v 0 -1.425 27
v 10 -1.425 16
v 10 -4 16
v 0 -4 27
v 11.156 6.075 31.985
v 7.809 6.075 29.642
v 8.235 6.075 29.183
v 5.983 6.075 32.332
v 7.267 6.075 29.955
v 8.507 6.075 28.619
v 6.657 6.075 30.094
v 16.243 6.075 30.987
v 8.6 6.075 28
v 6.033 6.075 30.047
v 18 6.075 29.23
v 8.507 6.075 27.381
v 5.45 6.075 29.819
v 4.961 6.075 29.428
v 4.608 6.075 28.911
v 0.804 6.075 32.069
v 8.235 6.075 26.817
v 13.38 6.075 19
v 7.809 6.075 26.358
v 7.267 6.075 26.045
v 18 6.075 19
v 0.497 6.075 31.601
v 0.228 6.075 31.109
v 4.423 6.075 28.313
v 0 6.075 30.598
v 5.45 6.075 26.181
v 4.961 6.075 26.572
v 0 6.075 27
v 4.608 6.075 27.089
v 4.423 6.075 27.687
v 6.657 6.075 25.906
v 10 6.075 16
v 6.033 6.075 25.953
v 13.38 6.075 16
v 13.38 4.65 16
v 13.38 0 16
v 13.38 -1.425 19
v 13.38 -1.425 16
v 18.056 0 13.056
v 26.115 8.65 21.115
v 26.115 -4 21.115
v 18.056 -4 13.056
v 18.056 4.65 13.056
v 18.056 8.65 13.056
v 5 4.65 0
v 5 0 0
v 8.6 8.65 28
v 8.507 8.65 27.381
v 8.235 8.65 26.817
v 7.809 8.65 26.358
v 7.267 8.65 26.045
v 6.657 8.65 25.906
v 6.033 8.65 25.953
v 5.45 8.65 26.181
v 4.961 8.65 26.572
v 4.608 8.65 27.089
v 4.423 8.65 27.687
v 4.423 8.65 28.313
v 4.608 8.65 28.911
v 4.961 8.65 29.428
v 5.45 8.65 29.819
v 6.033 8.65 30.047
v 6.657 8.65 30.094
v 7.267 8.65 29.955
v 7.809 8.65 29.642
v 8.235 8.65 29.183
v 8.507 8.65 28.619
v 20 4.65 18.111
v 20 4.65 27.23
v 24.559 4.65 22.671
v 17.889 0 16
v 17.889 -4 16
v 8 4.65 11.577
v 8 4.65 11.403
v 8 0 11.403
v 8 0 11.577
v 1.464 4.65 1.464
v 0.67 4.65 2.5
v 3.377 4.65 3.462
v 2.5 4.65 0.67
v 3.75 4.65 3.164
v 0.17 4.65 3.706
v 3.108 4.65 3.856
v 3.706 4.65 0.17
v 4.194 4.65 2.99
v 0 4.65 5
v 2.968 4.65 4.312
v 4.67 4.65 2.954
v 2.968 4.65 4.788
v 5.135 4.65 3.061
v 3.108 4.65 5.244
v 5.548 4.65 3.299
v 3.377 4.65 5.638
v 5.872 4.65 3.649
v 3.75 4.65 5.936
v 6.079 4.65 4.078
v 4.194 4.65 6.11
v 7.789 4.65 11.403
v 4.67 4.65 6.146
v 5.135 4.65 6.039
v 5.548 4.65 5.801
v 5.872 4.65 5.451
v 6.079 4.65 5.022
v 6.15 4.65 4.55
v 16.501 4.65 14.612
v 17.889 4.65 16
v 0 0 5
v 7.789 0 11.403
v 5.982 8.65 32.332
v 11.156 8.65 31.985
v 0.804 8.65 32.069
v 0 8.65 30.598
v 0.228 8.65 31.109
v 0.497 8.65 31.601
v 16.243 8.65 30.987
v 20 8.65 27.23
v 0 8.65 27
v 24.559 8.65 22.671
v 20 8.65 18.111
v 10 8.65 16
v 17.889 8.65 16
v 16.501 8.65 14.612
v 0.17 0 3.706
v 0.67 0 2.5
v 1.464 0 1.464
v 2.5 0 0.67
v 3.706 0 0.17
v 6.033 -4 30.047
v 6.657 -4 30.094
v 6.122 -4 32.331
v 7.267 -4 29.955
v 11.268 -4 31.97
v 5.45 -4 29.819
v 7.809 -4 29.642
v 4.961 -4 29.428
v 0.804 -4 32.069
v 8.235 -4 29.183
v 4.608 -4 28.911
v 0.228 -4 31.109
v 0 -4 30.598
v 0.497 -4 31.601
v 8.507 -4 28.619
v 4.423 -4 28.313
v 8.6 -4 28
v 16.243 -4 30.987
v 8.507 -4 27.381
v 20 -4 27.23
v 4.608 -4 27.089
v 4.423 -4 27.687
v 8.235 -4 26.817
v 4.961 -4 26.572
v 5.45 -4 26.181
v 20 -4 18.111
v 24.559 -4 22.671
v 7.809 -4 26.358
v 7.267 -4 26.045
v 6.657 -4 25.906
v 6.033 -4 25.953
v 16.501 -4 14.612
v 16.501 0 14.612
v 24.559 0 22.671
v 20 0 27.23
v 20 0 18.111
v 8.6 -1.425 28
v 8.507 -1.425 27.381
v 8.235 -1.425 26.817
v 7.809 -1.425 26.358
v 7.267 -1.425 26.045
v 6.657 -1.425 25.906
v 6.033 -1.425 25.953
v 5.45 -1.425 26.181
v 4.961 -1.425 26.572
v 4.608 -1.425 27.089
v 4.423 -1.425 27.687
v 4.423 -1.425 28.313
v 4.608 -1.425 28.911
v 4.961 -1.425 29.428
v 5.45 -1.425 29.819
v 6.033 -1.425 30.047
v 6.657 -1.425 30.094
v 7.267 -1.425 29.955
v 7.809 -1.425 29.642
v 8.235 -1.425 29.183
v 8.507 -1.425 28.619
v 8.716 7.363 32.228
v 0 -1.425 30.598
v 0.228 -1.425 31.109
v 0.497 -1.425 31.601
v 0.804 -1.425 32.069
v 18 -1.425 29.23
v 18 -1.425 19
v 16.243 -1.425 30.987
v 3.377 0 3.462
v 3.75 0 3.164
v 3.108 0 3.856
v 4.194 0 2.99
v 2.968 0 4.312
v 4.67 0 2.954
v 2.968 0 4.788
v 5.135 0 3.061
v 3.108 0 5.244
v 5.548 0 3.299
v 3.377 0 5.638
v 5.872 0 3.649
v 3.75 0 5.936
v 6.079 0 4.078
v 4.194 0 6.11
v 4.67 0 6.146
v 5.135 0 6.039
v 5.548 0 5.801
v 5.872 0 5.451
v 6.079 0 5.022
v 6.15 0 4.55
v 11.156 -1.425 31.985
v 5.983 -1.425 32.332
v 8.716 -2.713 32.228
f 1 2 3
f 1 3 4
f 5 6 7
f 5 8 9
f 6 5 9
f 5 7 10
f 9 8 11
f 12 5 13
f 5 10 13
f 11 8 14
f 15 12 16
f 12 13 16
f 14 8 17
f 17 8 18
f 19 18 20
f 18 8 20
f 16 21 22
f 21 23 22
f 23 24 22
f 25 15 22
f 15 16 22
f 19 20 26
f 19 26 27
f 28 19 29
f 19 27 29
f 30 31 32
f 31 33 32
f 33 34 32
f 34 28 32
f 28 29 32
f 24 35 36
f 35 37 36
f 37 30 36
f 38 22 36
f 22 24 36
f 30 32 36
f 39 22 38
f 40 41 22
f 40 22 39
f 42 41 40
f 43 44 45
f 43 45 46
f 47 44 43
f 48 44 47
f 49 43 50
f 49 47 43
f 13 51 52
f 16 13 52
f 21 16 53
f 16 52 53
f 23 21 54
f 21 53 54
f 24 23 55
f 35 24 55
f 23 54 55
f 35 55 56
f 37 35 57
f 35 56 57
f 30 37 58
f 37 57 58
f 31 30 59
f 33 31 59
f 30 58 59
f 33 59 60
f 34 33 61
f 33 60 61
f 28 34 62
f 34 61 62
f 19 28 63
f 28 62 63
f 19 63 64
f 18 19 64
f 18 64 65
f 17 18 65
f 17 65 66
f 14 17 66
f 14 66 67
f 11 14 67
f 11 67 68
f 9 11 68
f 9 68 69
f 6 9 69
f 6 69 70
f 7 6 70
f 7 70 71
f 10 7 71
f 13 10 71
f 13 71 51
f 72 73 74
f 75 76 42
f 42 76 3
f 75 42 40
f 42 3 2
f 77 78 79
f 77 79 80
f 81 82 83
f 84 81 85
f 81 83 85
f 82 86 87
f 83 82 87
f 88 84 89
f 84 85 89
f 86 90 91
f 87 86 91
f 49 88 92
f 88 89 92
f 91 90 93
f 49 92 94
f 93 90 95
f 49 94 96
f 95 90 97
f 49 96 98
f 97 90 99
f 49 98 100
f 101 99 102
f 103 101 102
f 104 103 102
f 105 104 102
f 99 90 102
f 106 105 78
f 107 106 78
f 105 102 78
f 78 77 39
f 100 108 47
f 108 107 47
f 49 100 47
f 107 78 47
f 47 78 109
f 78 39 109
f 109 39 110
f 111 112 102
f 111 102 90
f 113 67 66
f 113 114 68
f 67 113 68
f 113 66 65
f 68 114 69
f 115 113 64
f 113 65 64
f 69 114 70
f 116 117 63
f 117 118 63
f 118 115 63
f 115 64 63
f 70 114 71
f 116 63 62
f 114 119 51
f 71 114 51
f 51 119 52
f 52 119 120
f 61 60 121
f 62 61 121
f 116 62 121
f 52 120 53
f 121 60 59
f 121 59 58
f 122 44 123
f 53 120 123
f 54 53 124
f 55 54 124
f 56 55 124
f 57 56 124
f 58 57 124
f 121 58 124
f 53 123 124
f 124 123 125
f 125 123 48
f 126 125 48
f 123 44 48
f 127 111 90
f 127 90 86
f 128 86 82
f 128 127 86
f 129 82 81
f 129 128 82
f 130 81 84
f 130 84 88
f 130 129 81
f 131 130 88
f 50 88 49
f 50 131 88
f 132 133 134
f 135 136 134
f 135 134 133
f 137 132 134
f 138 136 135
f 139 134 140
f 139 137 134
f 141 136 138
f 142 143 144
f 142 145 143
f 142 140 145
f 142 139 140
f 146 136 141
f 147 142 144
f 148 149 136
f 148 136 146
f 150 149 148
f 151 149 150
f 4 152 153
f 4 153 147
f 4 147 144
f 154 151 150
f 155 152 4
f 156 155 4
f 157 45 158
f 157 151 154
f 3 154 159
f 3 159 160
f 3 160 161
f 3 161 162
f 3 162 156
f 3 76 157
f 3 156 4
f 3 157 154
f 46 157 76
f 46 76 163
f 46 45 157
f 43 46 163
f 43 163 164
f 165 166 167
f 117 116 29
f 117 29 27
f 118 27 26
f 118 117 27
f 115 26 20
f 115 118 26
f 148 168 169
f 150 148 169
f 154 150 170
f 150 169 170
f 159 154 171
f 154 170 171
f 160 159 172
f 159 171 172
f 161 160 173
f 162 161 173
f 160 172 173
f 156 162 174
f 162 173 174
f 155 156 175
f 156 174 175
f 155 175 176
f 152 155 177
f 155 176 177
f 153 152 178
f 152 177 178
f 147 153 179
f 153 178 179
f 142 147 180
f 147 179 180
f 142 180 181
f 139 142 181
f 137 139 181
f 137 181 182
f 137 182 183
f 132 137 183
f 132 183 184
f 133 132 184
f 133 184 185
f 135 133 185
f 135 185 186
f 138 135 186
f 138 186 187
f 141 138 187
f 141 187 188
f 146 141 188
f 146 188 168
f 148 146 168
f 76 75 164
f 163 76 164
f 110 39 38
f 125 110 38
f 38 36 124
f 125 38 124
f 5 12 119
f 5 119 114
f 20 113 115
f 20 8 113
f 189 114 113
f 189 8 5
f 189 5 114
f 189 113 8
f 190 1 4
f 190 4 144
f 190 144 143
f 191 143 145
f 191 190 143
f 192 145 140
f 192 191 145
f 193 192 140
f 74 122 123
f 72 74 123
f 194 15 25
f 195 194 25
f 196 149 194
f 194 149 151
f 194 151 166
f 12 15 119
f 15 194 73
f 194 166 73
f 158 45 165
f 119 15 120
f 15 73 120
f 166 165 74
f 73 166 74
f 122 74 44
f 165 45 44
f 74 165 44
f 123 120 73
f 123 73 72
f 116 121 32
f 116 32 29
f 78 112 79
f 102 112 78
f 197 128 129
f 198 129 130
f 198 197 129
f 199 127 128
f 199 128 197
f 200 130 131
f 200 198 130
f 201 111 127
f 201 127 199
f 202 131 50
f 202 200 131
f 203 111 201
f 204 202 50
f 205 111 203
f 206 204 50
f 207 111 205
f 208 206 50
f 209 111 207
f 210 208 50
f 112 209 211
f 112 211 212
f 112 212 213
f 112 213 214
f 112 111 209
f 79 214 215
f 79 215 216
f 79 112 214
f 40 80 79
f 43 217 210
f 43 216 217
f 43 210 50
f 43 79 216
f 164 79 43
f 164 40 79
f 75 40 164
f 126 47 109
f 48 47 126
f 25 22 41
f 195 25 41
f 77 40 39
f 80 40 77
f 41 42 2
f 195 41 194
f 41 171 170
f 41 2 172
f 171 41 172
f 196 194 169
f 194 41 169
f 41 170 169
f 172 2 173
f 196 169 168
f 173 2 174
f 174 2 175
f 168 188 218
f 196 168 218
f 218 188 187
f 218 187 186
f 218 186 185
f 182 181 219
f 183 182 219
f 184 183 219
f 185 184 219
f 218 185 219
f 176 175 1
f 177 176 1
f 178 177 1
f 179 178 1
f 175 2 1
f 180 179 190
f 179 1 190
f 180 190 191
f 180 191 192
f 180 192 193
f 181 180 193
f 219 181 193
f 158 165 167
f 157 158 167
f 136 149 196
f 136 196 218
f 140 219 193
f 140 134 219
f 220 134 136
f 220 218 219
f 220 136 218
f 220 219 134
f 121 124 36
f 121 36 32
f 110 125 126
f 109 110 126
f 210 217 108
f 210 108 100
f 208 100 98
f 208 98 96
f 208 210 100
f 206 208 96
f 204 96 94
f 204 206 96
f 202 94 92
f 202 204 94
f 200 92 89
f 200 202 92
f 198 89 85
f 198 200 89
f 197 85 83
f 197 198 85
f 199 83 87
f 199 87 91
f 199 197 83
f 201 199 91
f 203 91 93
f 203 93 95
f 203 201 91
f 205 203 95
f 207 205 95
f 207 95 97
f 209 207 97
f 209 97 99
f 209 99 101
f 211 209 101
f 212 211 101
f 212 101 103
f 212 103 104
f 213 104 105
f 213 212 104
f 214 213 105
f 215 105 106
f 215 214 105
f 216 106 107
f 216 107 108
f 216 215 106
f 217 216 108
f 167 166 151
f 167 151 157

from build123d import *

# Parameters (mm, degrees)
SKETCH_1_R           = 1.6
EXTRUDE_1_DEPTH      = 4.65
SKETCH_7_W           = 9
SKETCH_7_H           = 19
EXTRUDE_4_DEPTH      = 4
SKETCH_8_W           = 9
SKETCH_8_H           = 19
EXTRUDE_5_DEPTH      = 4
SKETCH_9_W           = 16
SKETCH_9_H           = 7.5
CUT_EXTRUDE_3_DEPTH  = 9
SKETCH_11_R          = 2.1
CUT_EXTRUDE_5_DEPTH  = 26.4
EXTRUDE_6_DEPTH      = 9
SKETCH_13_W          = 19
SKETCH_13_H          = 12.65
EXTRUDE_7_DEPTH      = 2
SKETCH_15_W          = 7.596607022
SKETCH_15_H          = 7.5
CUT_EXTRUDE_6_DEPTH  = 8
CUT_EXTRUDE_7_DEPTH  = 8
EXTRUDE_8_DEPTH      = 4.65
CUT_EXTRUDE_9_DEPTH  = 4.65
SKETCH_20_W          = 5.380169682
SKETCH_20_H          = 3
CUT_EXTRUDE_10_DEPTH = 7.5
CUT_EXTRUDE_11_DEPTH = 4.65
CUT_EXTRUDE_13_DEPTH = 13
CUT_EXTRUDE_15_DEPTH = 13
SKETCH_26_W          = 18.396488504
SKETCH_26_H          = 12.65
EXTRUDE_9_DEPTH      = 2.2
SKETCH_28_W          = 2.5
SKETCH_28_H          = 12.65
CUT_EXTRUDE_17_DEPTH = 18
CUT_EXTRUDE_18_DEPTH = 14
SKETCH_31_W          = 5
SKETCH_31_H          = 12.65
CUT_EXTRUDE_19_DEPTH = 20


with BuildPart() as part:
    # 草图1 → 凸台-拉伸1 (new body)
    with BuildSketch(Plane(origin=(0, 0, 0), x_dir=(1, 0, 0), z_dir=(0, 1, 0))):
        with BuildLine():
            Line((5, 0), (20, 0))
            Line((20, 0), (20, -16))
            Line((20, -16), (9, -16))
            Line((9, -16), (9, -35))
            Line((9, -35), (0, -35))
            Line((0, -35), (0, -27))
            Line((0, -27), (0, -5))
            ThreePointArc((0, -5), (1.464466094, -1.464466094), (5, 0))
        make_face()
        with Locations((4.55, -4.55)):
            Circle(SKETCH_1_R, mode=Mode.SUBTRACT)
    extrude(amount=EXTRUDE_1_DEPTH)

    # 草图7 → 凸台-拉伸4 (add)
    with BuildSketch(Plane(origin=(0, 4.65, 0), x_dir=(1, 0, 0), z_dir=(0, 1, 0))):
        with Locations((4.5, -25.5)):
            Rectangle(SKETCH_7_W, SKETCH_7_H)
    extrude(amount=EXTRUDE_4_DEPTH)

    # 草图8 → 凸台-拉伸5 (add)
    with BuildSketch(Plane.XZ):
        with Locations((4.5, 25.5)):
            Rectangle(SKETCH_8_W, SKETCH_8_H)
    extrude(amount=EXTRUDE_5_DEPTH)

    # 草图9 → 切除-拉伸3 (cut)
    with BuildSketch(Plane.ZY):
        with Locations((27, 2.325)):
            Rectangle(SKETCH_9_W, SKETCH_9_H)
    extrude(amount=-CUT_EXTRUDE_3_DEPTH, mode=Mode.SUBTRACT)

    # 草图11 → 切除-拉伸5 (cut)
    with BuildSketch(Plane(origin=(0, 8.65, 0), x_dir=(1, 0, 0), z_dir=(0, 1, 0))):
        with Locations((6.5, -28)):
            Circle(SKETCH_11_R)
    extrude(amount=-CUT_EXTRUDE_5_DEPTH, mode=Mode.SUBTRACT)

    # 草图12 → 凸台-拉伸6 (add)
    with BuildSketch(Plane(origin=(9, 0, 0), x_dir=(0, 0, -1), z_dir=(1, 0, 0))):
        Polygon((-35, 8.65), (-35, 6.075), (-19, 6.075), (-19, -1.425), (-35, -1.425), (-35, -4), (-16, -4), (-16, 8.65), align=None)
    extrude(amount=EXTRUDE_6_DEPTH)

    # 草图13 → 凸台-拉伸7 (add)
    with BuildSketch(Plane(origin=(18, 0, 0), x_dir=(0, 0, -1), z_dir=(1, 0, 0))):
        with Locations((-25.5, 2.325)):
            Rectangle(SKETCH_13_W, SKETCH_13_H)
    extrude(amount=EXTRUDE_7_DEPTH)

    # 草图15 → 切除-拉伸6 (cut)
    with BuildSketch(Plane.ZY):
        with Locations((15.201696489, 2.325)):
            Rectangle(SKETCH_15_W, SKETCH_15_H)
    extrude(amount=-CUT_EXTRUDE_6_DEPTH, mode=Mode.SUBTRACT)

    # 草图16 → 切除-拉伸7 (cut)
    with BuildSketch(Plane(origin=(0, 4.65, 0), x_dir=(1, 0, 0), z_dir=(0, 1, 0))):
        Polygon((0, -5), (5.890898071, -11.403392978), (0, -11.403392978), align=None)
    extrude(amount=-CUT_EXTRUDE_7_DEPTH, mode=Mode.SUBTRACT)

    # 草图17 → 凸台-拉伸8 (add)
    with BuildSketch(Plane.XZ):
        with BuildLine():
            Line((20, 35), (20, 15))
            Line((20, 15), (31.064630957, 26.064630957))
            ThreePointArc((31.064630957, 26.064630957), (26.002686727, 31.114774273), (20, 35))
        make_face()
    extrude(amount=-EXTRUDE_8_DEPTH)

    # 草图19 → 切除-拉伸9 (cut)
    with BuildSketch(Plane(origin=(0, 4.65, 0), x_dir=(1, 0, 0), z_dir=(0, 1, 0))):
        Polygon((20, -15), (5, 0), (20, 0), align=None)
    extrude(amount=-CUT_EXTRUDE_9_DEPTH, mode=Mode.SUBTRACT)

    # 草图20 → 切除-拉伸10 (cut)
    with BuildSketch(Plane(origin=(0, -1.425, 0), x_dir=(1, 0, 0), z_dir=(0, 1, 0))):
        with Locations((10.690084841, -17.5)):
            Rectangle(SKETCH_20_W, SKETCH_20_H)
    extrude(amount=CUT_EXTRUDE_10_DEPTH, mode=Mode.SUBTRACT)

    # 草图21 → 切除-拉伸11 (cut)
    with BuildSketch(Plane.XZ):
        Polygon((13.380169682, 16), (0, 5), (8, 16), align=None)
    extrude(amount=-CUT_EXTRUDE_11_DEPTH, mode=Mode.SUBTRACT)

    # 草图22 → 切除-拉伸13 (cut)
    with BuildSketch(Plane(origin=(0, 8.65, 0), x_dir=(1, 0, 0), z_dir=(0, 1, 0))):
        Polygon((0, -16), (10, -16), (0, -27), align=None)
    extrude(amount=-CUT_EXTRUDE_13_DEPTH, mode=Mode.SUBTRACT)

    # 草图23 → 切除-拉伸15 (cut)
    with BuildSketch(Plane(origin=(0, 8.65, 0), x_dir=(1, 0, 0), z_dir=(0, 1, 0))):
        with BuildLine():
            Line((6.5, -35), (0, -35))
            Line((0, -35), (0, -30.598076211))
            ThreePointArc((0, -30.598076211), (2.574858823, -33.79596987), (6.5, -35))
        make_face()
    extrude(amount=-CUT_EXTRUDE_15_DEPTH, mode=Mode.SUBTRACT)

    # 草图26 → 凸台-拉伸9 (add)
    with BuildSketch(Plane(origin=(2.5, 0, -2.5), x_dir=(-0.707106781, 0, -0.707106781), z_dir=(0.707106781, 0, -0.707106781))):
        with Locations((-31.198244252, 2.325)):
            Rectangle(SKETCH_26_W, SKETCH_26_H)
    extrude(amount=-EXTRUDE_9_DEPTH)

    # 草图28 → 切除-拉伸17 (cut)
    with BuildSketch(Plane(origin=(2.5, 0, -2.5), x_dir=(-0.707106781, 0, -0.707106781), z_dir=(0.707106781, 0, -0.707106781))):
        with Locations((-39.646488504, 2.325)):
            Rectangle(SKETCH_28_W, SKETCH_28_H)
    extrude(amount=-CUT_EXTRUDE_17_DEPTH, mode=Mode.SUBTRACT)

    # 草图29 → 切除-拉伸18 (cut)
    with BuildSketch(Plane.XZ.offset(4)):
        with BuildLine():
            Line((29.650417395, 24.650417395), (19.300834789, 35))
            Line((19.300834789, 35), (1.773611639, 35))
            Line((1.773611639, 35), (0.803925841, 32.06875155))
            add(Edge.make_bspline(
                [(29.650417395, 24.650417395), (16.711479186, 33.756910479), (0.803925841, 32.06875155)],
                knots=[0, 0, 0, 1, 1, 1], degree=2))
        make_face()
    extrude(amount=-CUT_EXTRUDE_18_DEPTH, mode=Mode.SUBTRACT)

    # 草图31 → 切除-拉伸19 (cut)
    with BuildSketch(Plane(origin=(2.5, 0, -2.5), x_dir=(-0.707106781, 0, -0.707106781), z_dir=(0.707106781, 0, -0.707106781))):
        with Locations((-35.896488504, 2.325)):
            Rectangle(SKETCH_31_W, SKETCH_31_H)
    extrude(amount=-CUT_EXTRUDE_19_DEPTH, mode=Mode.SUBTRACT)


solid = part.part
